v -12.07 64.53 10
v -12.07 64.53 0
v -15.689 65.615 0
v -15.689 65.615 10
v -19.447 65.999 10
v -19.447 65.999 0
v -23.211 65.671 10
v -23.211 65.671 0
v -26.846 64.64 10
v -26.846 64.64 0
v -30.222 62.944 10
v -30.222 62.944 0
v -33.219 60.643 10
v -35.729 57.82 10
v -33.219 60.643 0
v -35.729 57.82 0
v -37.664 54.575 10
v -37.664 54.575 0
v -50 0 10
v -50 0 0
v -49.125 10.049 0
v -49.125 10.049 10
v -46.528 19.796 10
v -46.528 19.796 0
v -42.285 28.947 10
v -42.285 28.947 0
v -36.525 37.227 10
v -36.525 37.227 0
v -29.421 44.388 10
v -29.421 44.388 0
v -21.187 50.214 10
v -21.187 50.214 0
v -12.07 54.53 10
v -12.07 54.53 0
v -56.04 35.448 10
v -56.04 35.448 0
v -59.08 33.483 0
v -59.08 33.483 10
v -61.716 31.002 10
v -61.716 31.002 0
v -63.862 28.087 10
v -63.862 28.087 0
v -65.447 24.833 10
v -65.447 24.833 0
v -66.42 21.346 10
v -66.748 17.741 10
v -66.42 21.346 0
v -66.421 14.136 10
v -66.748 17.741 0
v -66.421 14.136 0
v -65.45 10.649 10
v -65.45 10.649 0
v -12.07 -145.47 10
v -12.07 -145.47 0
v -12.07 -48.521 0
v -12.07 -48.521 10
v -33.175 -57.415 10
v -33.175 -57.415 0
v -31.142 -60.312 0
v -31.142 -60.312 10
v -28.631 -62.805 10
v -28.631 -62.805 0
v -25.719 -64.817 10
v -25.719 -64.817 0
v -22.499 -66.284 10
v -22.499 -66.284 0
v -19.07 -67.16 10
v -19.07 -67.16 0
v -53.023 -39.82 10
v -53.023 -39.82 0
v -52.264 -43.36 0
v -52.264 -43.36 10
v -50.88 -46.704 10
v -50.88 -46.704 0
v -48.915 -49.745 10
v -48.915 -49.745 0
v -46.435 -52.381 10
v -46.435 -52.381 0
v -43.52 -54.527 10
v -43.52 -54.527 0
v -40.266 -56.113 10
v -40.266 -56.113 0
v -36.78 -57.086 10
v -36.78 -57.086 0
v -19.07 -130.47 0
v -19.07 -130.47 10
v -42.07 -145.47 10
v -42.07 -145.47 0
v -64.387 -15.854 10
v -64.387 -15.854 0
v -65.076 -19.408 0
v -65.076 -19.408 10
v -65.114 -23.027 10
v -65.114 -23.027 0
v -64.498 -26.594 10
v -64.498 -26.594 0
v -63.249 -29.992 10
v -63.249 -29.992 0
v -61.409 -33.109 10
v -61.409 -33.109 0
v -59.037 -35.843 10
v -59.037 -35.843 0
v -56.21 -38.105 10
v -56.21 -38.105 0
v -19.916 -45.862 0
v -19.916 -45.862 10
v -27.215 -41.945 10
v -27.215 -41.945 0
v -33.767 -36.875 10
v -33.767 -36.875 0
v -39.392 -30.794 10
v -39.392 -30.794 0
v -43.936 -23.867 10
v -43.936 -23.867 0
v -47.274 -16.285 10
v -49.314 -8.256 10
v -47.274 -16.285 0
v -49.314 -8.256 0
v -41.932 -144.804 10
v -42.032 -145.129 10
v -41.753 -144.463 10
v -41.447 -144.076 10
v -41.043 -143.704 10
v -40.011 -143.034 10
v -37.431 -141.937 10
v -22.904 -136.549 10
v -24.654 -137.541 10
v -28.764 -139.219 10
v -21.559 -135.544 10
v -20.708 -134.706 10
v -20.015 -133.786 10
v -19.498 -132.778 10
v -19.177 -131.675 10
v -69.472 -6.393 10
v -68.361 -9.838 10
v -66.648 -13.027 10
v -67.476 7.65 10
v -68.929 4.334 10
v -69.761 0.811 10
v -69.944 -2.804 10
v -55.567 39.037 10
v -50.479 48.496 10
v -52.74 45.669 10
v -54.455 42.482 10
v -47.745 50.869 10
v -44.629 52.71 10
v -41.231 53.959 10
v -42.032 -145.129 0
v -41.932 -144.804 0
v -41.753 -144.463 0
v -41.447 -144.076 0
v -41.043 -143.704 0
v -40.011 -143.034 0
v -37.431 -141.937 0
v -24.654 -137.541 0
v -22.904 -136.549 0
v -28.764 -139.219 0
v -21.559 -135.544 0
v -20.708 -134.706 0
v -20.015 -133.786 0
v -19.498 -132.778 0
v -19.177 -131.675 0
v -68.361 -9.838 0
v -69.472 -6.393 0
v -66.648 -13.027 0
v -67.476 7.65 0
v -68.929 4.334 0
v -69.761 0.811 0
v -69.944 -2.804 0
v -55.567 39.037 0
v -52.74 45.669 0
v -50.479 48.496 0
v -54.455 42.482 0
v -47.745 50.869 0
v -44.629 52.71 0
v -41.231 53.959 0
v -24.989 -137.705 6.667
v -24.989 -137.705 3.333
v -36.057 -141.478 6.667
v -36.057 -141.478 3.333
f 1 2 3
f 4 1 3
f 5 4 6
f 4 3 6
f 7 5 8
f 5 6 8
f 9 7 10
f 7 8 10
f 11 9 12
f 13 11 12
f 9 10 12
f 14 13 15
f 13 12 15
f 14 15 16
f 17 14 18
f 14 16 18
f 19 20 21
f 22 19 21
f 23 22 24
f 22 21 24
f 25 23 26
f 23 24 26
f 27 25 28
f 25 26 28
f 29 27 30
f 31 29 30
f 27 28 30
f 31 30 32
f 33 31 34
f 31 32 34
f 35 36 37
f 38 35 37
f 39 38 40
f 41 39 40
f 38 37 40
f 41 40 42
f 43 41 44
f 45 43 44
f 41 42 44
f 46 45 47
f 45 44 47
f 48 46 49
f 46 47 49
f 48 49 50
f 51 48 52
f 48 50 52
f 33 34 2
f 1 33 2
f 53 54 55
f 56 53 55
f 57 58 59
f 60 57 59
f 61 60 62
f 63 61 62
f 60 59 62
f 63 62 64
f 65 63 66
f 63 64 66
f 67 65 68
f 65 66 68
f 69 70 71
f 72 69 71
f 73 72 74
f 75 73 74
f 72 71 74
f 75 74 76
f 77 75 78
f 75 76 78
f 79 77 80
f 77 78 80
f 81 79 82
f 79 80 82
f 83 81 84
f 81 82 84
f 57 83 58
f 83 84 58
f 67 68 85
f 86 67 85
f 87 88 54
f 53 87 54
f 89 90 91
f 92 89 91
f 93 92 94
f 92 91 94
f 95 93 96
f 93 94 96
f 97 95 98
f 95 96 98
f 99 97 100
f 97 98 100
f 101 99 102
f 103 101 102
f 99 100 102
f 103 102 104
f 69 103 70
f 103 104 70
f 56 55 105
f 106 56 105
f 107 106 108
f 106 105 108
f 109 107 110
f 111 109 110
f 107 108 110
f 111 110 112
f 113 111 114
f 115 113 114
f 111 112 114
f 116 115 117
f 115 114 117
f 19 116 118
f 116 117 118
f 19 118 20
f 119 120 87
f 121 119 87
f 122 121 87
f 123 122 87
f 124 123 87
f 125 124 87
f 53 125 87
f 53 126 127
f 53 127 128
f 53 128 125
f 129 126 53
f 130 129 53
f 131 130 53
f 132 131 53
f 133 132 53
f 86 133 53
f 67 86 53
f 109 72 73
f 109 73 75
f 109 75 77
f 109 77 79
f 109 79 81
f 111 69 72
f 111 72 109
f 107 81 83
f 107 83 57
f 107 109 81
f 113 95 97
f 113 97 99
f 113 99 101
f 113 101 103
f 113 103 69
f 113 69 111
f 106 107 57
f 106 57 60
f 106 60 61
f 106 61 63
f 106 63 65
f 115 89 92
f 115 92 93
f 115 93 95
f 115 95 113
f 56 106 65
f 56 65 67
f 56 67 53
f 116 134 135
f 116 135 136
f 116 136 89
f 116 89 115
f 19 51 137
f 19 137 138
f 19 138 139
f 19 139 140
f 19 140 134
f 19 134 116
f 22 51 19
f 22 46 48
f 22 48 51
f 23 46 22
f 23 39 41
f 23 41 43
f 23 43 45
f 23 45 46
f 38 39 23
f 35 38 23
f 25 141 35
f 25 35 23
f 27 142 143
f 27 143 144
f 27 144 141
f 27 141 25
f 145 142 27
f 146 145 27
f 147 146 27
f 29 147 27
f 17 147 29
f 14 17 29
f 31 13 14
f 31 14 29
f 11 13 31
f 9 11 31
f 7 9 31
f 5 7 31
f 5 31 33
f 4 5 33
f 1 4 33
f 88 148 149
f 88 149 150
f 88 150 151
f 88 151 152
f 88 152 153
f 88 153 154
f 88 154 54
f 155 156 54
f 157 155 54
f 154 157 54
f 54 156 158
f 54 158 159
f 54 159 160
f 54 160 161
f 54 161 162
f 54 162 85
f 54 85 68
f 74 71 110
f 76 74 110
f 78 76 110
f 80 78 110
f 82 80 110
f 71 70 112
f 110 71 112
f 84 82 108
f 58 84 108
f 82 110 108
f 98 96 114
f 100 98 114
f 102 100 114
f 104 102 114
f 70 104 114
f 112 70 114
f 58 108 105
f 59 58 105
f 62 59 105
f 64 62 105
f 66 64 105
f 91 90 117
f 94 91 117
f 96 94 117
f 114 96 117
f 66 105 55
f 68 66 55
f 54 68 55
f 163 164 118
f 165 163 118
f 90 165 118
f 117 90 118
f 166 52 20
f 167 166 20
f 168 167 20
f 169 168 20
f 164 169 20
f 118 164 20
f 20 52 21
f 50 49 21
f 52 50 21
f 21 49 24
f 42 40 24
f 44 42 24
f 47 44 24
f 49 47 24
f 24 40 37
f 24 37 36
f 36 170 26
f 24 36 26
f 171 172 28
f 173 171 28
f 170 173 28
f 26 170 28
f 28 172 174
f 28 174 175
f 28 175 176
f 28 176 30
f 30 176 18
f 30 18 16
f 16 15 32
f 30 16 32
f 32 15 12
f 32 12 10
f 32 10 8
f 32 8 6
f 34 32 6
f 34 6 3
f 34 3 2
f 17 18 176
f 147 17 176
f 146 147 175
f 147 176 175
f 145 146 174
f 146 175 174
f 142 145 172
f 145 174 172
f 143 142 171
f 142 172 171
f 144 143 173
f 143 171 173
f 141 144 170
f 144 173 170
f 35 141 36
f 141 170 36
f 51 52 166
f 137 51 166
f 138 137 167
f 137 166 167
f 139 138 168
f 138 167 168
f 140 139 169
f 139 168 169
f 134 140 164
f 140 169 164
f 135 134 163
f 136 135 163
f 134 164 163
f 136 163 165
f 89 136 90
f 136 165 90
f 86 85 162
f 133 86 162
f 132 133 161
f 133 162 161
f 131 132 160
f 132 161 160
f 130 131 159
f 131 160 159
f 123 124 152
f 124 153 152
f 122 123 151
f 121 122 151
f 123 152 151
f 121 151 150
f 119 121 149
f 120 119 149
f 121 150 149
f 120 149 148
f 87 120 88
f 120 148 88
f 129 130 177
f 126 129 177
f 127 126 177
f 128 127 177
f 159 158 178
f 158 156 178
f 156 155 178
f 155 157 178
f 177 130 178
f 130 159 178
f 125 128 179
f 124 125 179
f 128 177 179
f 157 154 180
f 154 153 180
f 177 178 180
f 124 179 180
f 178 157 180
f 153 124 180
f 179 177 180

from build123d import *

# Parameters (mm, degrees)
F1_DEPTH = 10


with BuildPart() as f1:
    # F0 (on Top) → F1 (new body)
    with BuildSketch(Plane.XY):
        with BuildLine():
            Line((-12.07, 54.529991), (-12.07, 64.529991))
            ThreePointArc((-12.07, 64.529991), (-26.845727, 64.63975), (-37.664252, 54.575273))
            ThreePointArc((-37.664252, 54.575273), (-50.479085, 48.496), (-56.040163, 35.447939))
            ThreePointArc((-56.040163, 35.447939), (-65.447231, 24.83264), (-65.449648, 10.648935))
            ThreePointArc((-65.449648, 10.648935), (-69.94382, -2.803942), (-64.38719, -15.853898))
            ThreePointArc((-64.38719, -15.853898), (-63.249398, -29.991894), (-53.022781, -39.820108))
            ThreePointArc((-53.022781, -39.820108), (-46.435072, -52.381143), (-33.174727, -57.415101))
            ThreePointArc((-33.174727, -57.415101), (-27.219481, -63.87559), (-19.07, -67.160226))
            Line((-19.07, -67.160226), (-19.07, -130.470009))
            add(Edge.make_bspline(
                [(-19.07, -130.470009), (-19.012991, -140.66343), (-41.987017, -140.141293), (-42.07, -145.470009)],
                knots=[0, 0, 0, 0, 27.45906, 27.45906, 27.45906, 27.45906], degree=3))
            Line((-42.07, -145.470009), (-12.07, -145.470009))
            Line((-12.07, -145.470009), (-12.07, -48.521285))
            ThreePointArc((-12.07, -48.521285), (-39.392258, -30.793668), (-50, 0))
            ThreePointArc((-50, 0), (-39.585008, 33.212215), (-12.07, 54.529991))
        make_face()
    extrude(amount=F1_DEPTH)


solid = f1.part
